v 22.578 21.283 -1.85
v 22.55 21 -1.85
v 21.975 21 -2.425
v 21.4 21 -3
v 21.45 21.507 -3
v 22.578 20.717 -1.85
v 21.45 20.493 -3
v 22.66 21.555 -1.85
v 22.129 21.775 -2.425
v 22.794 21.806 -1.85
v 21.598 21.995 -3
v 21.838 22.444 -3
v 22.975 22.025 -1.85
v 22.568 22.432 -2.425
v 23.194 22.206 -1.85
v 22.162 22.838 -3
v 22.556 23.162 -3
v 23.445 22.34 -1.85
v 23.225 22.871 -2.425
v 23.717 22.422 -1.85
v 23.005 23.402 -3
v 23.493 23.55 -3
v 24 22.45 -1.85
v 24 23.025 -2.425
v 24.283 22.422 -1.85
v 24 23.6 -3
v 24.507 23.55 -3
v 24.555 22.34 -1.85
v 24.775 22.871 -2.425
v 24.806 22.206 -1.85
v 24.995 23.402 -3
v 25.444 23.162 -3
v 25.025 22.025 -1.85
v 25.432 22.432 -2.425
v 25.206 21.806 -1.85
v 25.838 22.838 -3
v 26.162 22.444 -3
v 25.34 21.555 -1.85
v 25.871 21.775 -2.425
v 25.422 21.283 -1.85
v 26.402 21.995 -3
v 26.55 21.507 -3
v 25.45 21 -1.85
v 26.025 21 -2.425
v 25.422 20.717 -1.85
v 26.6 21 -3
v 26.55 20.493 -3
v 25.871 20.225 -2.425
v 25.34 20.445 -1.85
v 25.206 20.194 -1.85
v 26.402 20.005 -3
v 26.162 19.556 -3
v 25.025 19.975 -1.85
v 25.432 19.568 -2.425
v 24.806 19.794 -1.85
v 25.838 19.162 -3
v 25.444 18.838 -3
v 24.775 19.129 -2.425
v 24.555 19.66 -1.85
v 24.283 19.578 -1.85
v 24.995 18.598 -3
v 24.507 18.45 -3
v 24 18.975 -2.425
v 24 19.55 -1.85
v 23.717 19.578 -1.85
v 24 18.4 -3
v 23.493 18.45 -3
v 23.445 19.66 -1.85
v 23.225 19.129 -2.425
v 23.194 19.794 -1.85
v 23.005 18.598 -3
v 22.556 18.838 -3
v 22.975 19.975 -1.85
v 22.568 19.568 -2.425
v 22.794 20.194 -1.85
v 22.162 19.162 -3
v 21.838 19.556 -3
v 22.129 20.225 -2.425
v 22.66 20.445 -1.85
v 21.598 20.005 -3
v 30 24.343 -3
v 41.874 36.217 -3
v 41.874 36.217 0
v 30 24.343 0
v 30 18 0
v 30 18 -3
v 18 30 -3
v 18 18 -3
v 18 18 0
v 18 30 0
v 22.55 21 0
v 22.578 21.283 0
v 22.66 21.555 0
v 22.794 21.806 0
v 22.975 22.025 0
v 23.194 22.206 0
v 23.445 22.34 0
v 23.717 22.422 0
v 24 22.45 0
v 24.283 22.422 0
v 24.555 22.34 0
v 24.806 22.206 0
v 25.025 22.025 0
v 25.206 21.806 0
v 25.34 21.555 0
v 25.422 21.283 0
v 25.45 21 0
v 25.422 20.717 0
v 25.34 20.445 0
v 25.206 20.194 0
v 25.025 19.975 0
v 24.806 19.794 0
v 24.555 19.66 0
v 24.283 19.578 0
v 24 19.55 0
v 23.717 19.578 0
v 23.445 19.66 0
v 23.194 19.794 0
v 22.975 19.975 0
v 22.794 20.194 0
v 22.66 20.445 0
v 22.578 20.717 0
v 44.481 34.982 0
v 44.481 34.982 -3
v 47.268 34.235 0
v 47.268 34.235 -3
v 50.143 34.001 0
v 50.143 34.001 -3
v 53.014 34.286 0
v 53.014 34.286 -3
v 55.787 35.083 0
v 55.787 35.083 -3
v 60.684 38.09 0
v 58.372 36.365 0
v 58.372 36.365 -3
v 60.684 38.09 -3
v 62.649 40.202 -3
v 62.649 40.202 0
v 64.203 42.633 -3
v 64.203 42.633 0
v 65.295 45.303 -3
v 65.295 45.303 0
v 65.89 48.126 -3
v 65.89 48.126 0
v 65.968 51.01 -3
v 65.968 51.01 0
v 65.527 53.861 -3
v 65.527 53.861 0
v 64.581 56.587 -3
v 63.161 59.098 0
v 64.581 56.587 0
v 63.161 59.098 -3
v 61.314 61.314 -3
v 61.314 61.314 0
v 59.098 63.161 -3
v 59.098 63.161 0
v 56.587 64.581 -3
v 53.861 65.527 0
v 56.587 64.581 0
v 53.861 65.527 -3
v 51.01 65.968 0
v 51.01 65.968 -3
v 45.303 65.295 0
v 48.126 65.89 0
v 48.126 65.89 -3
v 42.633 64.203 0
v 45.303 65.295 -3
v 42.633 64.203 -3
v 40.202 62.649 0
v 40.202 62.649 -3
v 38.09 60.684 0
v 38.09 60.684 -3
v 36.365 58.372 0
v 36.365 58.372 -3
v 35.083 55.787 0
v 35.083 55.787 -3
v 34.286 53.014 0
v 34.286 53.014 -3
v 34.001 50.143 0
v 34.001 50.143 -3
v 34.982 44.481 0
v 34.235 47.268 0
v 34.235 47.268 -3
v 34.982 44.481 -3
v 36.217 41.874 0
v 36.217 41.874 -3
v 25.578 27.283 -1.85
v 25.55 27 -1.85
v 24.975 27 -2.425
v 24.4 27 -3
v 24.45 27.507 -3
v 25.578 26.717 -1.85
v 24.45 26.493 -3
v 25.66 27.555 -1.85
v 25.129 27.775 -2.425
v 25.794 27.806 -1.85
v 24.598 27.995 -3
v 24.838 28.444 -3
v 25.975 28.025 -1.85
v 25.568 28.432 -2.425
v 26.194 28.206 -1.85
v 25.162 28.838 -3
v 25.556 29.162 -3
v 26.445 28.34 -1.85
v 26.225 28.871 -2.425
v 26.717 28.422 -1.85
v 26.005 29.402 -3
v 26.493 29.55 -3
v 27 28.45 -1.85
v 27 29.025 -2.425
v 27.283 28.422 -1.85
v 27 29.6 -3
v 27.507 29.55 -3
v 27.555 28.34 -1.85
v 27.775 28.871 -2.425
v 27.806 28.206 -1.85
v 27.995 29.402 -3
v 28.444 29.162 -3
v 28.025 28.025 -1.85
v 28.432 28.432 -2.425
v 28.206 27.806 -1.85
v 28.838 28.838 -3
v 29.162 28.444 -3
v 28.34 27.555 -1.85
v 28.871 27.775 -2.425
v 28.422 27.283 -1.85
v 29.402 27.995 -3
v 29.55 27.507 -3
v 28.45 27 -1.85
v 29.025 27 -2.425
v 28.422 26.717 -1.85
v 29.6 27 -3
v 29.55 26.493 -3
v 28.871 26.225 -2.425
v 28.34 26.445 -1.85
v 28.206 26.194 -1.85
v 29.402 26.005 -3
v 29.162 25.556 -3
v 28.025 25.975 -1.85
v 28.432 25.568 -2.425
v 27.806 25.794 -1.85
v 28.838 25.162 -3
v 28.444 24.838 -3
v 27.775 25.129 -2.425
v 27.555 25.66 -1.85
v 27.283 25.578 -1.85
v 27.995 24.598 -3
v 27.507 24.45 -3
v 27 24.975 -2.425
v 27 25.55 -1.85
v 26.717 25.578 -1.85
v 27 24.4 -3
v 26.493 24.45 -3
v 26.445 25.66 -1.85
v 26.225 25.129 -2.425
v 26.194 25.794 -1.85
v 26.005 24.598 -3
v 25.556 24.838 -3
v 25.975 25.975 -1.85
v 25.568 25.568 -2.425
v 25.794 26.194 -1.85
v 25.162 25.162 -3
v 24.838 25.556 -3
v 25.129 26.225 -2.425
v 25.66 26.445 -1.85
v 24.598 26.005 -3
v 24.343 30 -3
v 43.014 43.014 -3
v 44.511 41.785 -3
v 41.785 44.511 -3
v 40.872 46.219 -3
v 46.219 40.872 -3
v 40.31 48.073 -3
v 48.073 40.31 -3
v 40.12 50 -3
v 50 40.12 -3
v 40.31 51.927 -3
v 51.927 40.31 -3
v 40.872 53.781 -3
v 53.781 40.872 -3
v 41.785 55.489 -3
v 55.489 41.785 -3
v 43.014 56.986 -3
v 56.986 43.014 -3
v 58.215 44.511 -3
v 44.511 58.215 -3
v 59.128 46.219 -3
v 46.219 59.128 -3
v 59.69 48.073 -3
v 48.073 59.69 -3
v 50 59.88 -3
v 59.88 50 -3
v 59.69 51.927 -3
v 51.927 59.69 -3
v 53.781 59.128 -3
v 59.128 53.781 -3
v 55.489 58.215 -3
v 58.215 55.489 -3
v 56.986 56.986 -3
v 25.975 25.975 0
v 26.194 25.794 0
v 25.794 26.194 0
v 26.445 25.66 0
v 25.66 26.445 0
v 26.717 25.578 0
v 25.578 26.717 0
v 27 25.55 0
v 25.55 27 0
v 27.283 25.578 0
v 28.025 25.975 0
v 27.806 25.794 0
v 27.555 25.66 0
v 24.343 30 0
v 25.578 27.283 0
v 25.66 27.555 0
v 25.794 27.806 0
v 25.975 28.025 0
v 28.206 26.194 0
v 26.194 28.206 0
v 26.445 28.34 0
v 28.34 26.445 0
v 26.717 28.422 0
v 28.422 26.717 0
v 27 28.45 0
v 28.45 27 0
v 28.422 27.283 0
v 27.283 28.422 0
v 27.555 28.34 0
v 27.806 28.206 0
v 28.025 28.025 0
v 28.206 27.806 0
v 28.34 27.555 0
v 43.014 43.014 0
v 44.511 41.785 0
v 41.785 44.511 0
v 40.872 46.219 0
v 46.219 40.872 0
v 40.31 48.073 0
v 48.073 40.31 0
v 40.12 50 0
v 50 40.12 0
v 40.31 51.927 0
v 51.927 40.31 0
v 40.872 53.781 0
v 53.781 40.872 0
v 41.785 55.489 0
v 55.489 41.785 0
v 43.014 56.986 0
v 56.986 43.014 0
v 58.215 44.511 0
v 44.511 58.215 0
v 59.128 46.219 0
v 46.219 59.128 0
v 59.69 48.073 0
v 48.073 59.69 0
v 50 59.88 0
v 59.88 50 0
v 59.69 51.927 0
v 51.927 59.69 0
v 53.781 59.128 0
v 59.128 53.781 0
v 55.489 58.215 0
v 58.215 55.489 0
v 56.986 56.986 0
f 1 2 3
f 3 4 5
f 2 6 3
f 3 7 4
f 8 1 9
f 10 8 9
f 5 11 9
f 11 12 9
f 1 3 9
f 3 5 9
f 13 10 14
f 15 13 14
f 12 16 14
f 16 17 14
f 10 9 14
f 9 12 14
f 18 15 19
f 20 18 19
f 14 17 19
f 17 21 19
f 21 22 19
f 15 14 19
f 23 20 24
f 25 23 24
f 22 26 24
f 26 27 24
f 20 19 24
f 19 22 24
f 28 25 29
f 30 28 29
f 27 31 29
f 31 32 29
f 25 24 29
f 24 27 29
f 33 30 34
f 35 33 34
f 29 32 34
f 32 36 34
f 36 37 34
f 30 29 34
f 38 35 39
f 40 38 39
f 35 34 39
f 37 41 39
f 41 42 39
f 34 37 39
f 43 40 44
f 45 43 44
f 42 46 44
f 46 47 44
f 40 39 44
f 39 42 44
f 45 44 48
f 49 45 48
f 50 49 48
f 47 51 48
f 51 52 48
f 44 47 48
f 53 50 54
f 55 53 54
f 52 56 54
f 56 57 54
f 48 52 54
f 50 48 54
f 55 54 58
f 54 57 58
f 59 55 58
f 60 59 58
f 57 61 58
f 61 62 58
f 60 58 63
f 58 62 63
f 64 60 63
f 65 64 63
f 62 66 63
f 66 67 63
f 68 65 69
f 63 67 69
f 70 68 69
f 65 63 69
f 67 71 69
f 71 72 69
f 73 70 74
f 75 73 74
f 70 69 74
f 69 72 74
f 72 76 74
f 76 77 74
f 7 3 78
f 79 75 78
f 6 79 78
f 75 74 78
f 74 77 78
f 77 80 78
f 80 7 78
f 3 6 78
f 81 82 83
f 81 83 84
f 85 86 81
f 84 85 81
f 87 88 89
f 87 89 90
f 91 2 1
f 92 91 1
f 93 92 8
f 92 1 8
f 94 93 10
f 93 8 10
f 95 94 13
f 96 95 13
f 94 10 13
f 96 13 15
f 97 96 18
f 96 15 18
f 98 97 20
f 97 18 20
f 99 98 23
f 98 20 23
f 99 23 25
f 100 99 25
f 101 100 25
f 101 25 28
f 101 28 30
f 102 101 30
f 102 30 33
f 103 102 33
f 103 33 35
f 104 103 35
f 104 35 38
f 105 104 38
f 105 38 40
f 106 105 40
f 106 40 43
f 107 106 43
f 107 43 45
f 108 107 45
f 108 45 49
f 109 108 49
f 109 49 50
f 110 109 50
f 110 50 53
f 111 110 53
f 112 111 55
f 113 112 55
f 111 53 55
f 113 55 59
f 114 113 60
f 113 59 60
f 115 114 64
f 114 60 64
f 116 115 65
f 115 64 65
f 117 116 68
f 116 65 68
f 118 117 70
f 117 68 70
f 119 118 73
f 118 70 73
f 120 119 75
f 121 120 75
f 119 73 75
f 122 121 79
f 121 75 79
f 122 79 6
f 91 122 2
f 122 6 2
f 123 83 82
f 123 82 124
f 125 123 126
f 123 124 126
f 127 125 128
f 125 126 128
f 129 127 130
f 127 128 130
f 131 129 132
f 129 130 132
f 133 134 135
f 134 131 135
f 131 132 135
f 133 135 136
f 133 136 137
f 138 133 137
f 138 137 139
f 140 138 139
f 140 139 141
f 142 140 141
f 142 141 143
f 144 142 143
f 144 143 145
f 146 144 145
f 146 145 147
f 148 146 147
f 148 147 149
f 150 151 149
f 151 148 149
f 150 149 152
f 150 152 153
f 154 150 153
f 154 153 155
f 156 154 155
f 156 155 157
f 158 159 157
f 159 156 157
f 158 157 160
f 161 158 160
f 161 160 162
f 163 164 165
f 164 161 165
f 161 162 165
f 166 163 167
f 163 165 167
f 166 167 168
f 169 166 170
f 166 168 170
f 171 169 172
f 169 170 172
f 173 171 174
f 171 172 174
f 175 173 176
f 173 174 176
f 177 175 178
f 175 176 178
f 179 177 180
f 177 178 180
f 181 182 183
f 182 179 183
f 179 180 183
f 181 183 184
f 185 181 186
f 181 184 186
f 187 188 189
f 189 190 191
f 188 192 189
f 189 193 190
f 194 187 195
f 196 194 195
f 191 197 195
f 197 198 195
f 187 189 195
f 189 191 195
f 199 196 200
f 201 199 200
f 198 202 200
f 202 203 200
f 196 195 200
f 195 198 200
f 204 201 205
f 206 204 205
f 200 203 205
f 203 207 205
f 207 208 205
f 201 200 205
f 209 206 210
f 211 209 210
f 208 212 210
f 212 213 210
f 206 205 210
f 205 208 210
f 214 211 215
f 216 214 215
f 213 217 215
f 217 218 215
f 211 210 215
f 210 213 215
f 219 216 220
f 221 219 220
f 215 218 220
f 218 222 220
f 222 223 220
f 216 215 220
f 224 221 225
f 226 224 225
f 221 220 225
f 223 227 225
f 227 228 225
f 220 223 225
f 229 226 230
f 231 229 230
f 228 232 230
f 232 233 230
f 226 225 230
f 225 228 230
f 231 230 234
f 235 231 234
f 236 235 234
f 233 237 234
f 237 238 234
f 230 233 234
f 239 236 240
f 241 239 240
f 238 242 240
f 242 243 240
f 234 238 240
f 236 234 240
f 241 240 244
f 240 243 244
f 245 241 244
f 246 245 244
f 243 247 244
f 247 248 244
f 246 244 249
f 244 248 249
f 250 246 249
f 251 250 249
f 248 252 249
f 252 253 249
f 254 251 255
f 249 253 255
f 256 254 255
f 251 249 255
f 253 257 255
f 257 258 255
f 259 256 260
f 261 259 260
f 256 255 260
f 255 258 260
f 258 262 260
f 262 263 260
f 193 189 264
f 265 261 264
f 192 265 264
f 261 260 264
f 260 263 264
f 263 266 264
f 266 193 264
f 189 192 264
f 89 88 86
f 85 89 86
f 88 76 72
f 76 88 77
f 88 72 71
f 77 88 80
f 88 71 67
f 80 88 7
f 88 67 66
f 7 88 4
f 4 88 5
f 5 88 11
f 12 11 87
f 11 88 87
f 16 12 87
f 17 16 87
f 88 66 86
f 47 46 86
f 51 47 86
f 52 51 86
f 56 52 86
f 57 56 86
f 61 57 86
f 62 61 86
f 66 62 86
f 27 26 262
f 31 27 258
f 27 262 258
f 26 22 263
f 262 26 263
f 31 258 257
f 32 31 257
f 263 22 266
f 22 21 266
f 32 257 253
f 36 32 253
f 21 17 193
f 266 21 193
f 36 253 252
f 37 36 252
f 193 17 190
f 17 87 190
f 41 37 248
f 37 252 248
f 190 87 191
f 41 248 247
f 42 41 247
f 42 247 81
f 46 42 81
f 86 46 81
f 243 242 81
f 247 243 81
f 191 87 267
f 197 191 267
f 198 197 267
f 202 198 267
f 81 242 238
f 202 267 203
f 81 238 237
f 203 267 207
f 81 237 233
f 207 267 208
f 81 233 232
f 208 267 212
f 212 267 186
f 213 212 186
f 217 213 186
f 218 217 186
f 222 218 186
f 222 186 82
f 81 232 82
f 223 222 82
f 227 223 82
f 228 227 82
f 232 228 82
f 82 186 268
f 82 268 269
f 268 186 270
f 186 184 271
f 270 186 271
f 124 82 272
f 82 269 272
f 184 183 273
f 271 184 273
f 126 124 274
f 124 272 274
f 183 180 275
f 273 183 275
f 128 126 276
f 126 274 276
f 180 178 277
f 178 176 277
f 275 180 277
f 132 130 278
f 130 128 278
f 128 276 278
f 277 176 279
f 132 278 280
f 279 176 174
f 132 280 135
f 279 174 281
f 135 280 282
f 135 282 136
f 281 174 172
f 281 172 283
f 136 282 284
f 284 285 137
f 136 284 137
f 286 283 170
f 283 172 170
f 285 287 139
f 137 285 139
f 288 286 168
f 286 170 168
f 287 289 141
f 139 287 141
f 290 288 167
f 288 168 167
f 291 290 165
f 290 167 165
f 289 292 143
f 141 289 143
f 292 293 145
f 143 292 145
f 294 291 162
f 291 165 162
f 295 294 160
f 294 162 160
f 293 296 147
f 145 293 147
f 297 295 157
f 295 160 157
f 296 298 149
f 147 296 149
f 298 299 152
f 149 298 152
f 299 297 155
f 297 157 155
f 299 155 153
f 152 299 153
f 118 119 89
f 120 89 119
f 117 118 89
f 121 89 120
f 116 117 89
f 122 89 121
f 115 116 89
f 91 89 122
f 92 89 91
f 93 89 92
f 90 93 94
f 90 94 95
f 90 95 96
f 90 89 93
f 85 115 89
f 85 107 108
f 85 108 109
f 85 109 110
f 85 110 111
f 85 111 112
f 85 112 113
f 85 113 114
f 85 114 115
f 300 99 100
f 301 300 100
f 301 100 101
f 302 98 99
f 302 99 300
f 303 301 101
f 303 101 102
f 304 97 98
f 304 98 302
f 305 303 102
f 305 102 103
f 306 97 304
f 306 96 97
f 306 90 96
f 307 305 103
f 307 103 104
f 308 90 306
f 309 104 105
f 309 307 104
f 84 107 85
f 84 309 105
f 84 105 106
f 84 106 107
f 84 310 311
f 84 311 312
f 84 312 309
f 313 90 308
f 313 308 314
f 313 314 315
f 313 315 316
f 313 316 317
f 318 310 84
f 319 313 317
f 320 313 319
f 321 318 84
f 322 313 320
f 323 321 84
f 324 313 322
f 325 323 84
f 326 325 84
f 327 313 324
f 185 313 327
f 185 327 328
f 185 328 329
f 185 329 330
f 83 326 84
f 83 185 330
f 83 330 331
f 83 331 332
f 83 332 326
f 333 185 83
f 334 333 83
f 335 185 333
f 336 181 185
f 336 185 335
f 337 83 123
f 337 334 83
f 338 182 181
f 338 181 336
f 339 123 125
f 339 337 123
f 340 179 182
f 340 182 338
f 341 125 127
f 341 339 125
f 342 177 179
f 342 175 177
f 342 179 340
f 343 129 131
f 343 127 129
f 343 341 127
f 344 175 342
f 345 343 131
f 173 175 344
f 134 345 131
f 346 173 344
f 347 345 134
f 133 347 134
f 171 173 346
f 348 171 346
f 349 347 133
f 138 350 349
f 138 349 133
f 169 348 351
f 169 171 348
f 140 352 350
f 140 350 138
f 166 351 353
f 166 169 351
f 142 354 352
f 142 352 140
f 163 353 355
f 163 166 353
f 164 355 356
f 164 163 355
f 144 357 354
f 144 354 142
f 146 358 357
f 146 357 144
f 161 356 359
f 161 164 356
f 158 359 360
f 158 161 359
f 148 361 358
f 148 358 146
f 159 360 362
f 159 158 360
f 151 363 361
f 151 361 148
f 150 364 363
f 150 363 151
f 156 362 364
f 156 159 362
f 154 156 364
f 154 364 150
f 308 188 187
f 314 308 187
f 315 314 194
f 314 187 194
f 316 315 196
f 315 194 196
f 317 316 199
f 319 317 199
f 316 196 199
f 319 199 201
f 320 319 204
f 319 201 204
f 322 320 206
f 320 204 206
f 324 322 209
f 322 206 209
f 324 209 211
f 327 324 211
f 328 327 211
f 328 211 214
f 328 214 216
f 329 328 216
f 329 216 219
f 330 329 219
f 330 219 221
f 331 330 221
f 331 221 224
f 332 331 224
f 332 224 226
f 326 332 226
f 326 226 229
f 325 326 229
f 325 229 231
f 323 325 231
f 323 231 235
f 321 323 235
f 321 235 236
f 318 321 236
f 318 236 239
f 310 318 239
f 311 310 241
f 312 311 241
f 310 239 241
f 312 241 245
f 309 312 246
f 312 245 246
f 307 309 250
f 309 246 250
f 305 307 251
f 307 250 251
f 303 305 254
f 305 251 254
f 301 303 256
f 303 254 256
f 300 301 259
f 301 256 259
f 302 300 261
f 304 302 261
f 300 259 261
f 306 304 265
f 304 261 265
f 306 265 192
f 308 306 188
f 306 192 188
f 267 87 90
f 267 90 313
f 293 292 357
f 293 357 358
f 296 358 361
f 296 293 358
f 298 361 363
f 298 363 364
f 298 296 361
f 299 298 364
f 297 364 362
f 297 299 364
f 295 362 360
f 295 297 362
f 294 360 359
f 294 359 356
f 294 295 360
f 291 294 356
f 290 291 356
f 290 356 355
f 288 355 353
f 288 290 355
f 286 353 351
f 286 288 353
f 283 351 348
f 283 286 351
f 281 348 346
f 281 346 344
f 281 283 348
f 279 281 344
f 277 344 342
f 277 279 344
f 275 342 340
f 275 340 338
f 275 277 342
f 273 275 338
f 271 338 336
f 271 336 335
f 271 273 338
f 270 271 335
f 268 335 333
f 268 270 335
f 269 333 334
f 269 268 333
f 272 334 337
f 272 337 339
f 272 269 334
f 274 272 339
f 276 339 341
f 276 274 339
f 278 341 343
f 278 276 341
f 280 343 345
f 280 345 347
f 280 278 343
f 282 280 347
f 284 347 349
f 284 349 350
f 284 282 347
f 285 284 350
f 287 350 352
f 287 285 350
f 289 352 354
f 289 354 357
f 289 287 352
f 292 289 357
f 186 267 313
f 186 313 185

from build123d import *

# Parameters (mm, degrees)
STOP_RING_D19P76_OD32_START               = -3
SKETCH1_R                                 = 16
SKETCH1_R_2                               = 9.88
STOP_RING_D19P76_OD32_DEPTH               = 3
OUTBOARD_BRIDGE_START                     = -3
OUTBOARD_BRIDGE_DEPTH                     = 3
BASE_ATTACHMENT_PAD_START                 = -3
SKETCH3_W                                 = 12
SKETCH3_H                                 = 12
BASE_ATTACHMENT_PAD_DEPTH                 = 3
SKETCH8_R                                 = 1.45
STOP_MOUNT_D2P9_THROUGH_DEPTH             = 3.01
SKETCH9_R                                 = 2.6
STOP_MOUNT_CSK_D5P2_90DEG_DEPTH           = 1.15
STOP_MOUNT_CSK_D5P2_90DEG_DRAFT           = -45
STOP_MOUNT_CSK_D5P2_90DEG_PROFILE_2_DEPTH = 1.15
STOP_MOUNT_CSK_D5P2_90DEG_PROFILE_2_DRAFT = -45


with BuildPart() as part:
    # Sketch1 → Stop_Ring_D19p76_OD32 (new body)
    with BuildSketch(Plane.XY.offset(STOP_RING_D19P76_OD32_START)):
        with Locations((50, 50)):
            Circle(SKETCH1_R)
        with Locations((50, 50)):
            Circle(SKETCH1_R_2, mode=Mode.SUBTRACT)
    extrude(amount=STOP_RING_D19P76_OD32_DEPTH)

    # Sketch2 → Outboard_Bridge (add)
    with BuildSketch(Plane.XY.offset(OUTBOARD_BRIDGE_START)):
        Polygon((21.171572875, 26.828427125), (37.671572875, 43.328427125), (43.328427125, 37.671572875), (26.828427125, 21.171572875), align=None)
    extrude(amount=OUTBOARD_BRIDGE_DEPTH)

    # Sketch3 → Base_Attachment_Pad (add)
    with BuildSketch(Plane.XY.offset(BASE_ATTACHMENT_PAD_START)):
        with Locations((24, 24)):
            Rectangle(SKETCH3_W, SKETCH3_H)
    extrude(amount=BASE_ATTACHMENT_PAD_DEPTH)

    # Sketch8 → Stop_Mount_D2p9_Through (cut)
    with BuildSketch(Plane(origin=(0, 0, -3), x_dir=(-1, 0, 0), z_dir=(0, 0, -1))):
        with Locations((-24, 21)):
            Circle(SKETCH8_R)
        with Locations((-27, 27)):
            Circle(SKETCH8_R)
    extrude(amount=-STOP_MOUNT_D2P9_THROUGH_DEPTH, mode=Mode.SUBTRACT)


with BuildPart() as stop_mount_csk_d5p2_90deg_tool:
    # Sketch9 → Stop_Mount_CSK_D5p2_90deg (with draft: the straight prism first)
    with BuildSketch(Plane(origin=(0, 0, -3), x_dir=(-1, 0, 0), z_dir=(0, 0, -1))):
        with Locations((-24, 21)):
            Circle(SKETCH9_R)
    extrude(amount=-STOP_MOUNT_CSK_D5P2_90DEG_DEPTH)
    # Stop_Mount_CSK_D5p2_90deg: the draft: its side faces are tilted about the plane it starts from
    stop_mount_csk_d5p2_90deg_sides = [stop_mount_csk_d5p2_90deg_tool.faces().sort_by_distance(p)[0] for p in [
        (26.6, 21, -2.425),
    ]]
    draft(stop_mount_csk_d5p2_90deg_sides, Plane(origin=(0, 0, -3), x_dir=(-1, 0, 0), z_dir=(0, 0, -1)), STOP_MOUNT_CSK_D5P2_90DEG_DRAFT)


with BuildPart() as part_1:
    add(part.part)

    # Stop_Mount_CSK_D5p2_90deg: cut by stop_mount_csk_d5p2_90deg_tool
    add(stop_mount_csk_d5p2_90deg_tool.part, mode=Mode.SUBTRACT)


with BuildPart() as stop_mount_csk_d5p2_90deg_profile_2_tool:
    # Sketch9 → Stop_Mount_CSK_D5p2_90deg profile 2 (with draft: the straight prism first)
    with BuildSketch(Plane(origin=(0, 0, -3), x_dir=(-1, 0, 0), z_dir=(0, 0, -1))):
        with Locations((-27, 27)):
            Circle(SKETCH9_R)
    extrude(amount=-STOP_MOUNT_CSK_D5P2_90DEG_PROFILE_2_DEPTH)
    # Stop_Mount_CSK_D5p2_90deg profile 2: the draft: its side faces are tilted about the plane it starts from
    stop_mount_csk_d5p2_90deg_profile_2_sides = [stop_mount_csk_d5p2_90deg_profile_2_tool.faces().sort_by_distance(p)[0] for p in [
        (29.6, 27, -2.425),
    ]]
    draft(stop_mount_csk_d5p2_90deg_profile_2_sides, Plane(origin=(0, 0, -3), x_dir=(-1, 0, 0), z_dir=(0, 0, -1)), STOP_MOUNT_CSK_D5P2_90DEG_PROFILE_2_DRAFT)


with BuildPart() as part_2:
    add(part_1.part)

    # Stop_Mount_CSK_D5p2_90deg profile 2: cut by stop_mount_csk_d5p2_90deg_profile_2_tool
    add(stop_mount_csk_d5p2_90deg_profile_2_tool.part, mode=Mode.SUBTRACT)


solid = part_2.part
